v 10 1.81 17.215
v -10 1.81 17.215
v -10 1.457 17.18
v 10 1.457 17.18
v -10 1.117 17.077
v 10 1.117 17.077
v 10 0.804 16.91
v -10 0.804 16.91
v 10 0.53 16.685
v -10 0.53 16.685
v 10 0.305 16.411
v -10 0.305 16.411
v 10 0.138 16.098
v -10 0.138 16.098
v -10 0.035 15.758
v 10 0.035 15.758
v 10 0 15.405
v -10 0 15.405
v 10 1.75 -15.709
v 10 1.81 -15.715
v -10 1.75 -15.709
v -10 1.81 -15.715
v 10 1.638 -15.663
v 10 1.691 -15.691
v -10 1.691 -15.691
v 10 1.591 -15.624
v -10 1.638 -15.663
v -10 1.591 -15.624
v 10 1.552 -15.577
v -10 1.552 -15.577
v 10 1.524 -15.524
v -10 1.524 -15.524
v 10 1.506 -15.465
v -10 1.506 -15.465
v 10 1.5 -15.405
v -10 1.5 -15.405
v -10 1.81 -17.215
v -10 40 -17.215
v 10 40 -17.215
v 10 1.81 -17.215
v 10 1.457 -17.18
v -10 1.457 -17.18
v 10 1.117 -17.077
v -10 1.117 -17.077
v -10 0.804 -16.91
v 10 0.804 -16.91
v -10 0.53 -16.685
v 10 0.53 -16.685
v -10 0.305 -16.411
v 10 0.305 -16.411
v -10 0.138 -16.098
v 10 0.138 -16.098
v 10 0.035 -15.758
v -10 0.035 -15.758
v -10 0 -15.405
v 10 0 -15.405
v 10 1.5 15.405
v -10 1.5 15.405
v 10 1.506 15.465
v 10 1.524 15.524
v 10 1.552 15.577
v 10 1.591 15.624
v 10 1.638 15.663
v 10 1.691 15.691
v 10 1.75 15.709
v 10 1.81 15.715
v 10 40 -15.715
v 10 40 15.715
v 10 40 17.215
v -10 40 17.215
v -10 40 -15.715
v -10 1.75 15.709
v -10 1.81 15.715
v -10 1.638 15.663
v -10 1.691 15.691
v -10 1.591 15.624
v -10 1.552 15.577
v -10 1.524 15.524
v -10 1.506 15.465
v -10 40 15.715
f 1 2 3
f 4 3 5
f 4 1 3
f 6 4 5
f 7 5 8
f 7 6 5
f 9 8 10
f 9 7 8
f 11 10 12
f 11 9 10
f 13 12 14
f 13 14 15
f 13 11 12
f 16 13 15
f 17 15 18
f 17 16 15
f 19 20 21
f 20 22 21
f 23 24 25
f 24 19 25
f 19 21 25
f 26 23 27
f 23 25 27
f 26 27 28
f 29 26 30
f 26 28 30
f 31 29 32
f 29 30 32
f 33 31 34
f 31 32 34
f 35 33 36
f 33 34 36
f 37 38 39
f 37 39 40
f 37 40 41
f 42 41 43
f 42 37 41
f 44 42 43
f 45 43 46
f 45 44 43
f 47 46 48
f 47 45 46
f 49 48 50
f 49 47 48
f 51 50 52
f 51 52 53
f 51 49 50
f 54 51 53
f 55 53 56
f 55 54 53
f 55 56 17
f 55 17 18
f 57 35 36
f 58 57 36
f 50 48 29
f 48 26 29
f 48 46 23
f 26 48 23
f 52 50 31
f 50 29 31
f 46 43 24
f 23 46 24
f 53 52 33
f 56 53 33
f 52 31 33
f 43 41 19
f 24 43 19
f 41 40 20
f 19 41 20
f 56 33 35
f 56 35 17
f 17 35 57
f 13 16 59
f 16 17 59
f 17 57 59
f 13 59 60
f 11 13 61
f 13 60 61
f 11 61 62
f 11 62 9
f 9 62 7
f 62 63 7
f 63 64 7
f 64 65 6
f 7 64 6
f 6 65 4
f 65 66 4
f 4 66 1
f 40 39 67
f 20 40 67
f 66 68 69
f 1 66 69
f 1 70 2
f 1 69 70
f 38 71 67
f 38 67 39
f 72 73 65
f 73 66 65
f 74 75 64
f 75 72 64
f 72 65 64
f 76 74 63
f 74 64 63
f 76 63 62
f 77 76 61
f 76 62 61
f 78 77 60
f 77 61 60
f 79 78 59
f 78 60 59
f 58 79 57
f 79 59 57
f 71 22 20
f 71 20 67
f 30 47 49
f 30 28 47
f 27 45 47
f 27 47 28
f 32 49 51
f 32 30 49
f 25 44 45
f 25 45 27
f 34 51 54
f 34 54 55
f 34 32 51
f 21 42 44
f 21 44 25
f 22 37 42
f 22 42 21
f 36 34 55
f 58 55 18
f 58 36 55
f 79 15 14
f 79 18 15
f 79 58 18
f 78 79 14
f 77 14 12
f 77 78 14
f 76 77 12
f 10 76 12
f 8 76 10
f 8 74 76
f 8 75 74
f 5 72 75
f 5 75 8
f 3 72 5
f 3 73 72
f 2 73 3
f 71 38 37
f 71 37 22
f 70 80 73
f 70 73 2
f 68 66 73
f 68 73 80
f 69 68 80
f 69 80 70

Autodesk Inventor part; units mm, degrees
ref_plane "YZ Plane" through (0, 0, 0) normal (1, 0, 0) x (0, 1, 0)
ref_plane "XZ Plane" through (0, 0, 0) normal (0, 1, 0) x (-1, 0, 0)
ref_plane "XY Plane" through (0, 0, 0) normal (0, 0, 1) x (1, 0, 0)
sketch "Sketch1" plane through (0, 0, 0) normal (0, 1, 0) x (-1, 0, 0)
  line L0 (10, -15.715) -> (-10, -15.715)
  line L1 (-10, -15.715) -> (-10, 15.715)
  line L2 (-10, 15.715) -> (10, 15.715)
  line L3 (10, 15.715) -> (10, -15.715)
  point P0 (0, 0)
  dimension "d0" = 20
  dimension "d1" = 31.43
  dimension "d2" = 10
  dimension "d3" = 15.715
extrude "Plate1" add sketch "Sketch1" along normal blind 1.5
sketch "Sketch2" plane through (10, 0, 17.215) normal (0, 0, -1) x (-1, 0, 0)
  line L0 (20, 0) -> (0, 0)
  line L1 (0, 0) -> (0, 40)
  line L2 (0, 40) -> (20, 40)
  line L3 (20, 40) -> (20, 0)
edge flange "Flange1" height 40 angle 90 thickness 1.5 bend radius 0.31 thickness toward (0, 0, -1) relief tear relief width 1.5 relief depth 0.75 edges at (0, 1.5, 15.715) wall of the first edge with corners at (-10, 0, 17.215) (10, 0, 17.215) (10, 40, 17.215) (-10, 40, 17.215)
bend "Bend1"
corner "Corner1"
sketch "Sketch3" plane through (-10, 0, -17.215) normal (0, 0, 1) x (1, 0, 0)
  line L0 (20, 0) -> (0, 0)
  line L1 (0, 0) -> (0, 40)
  line L2 (0, 40) -> (20, 40)
  line L3 (20, 40) -> (20, 0)
edge flange "Flange2" height 40 angle 90 thickness 1.5 bend radius 0.31 thickness toward (0, 0, 1) relief tear relief width 1.5 relief depth 0.75 edges at (0, 1.5, -15.715) wall of the first edge with corners at (10, 0, -17.215) (-10, 0, -17.215) (-10, 40, -17.215) (10, 40, -17.215)
bend "Bend2"
corner "Corner2"
equation "\"d4\" = Thickness"
equation "\"d5\" = BendReliefWidth"
equation "\"d6\" = BendReliefDepth"
equation "\"d7\" = MinimumRemnant"
equation "\"d8\" = TransitionRadius"
equation "\"d11\" = BendRadius"
equation "\"d12\" = CornerReliefSize"
equation "\"d13\" = GapSize"
equation "\"d14\" = JacobiRadiusSize"
equation "\"d15\" = BendReliefWidth"
equation "\"d16\" = BendReliefDepth"
equation "\"d17\" = MinimumRemnant"
equation "\"d18\" = TransitionRadius"
equation "\"d21\" = BendRadius"
equation "\"d22\" = CornerReliefSize"
equation "\"d23\" = GapSize"
equation "\"d24\" = JacobiRadiusSize"
equation "\"BendReliefWidth\" = Thickness"
equation "\"BendReliefDepth\" = 0.5 * Thickness"
equation "\"CornerReliefSize\" = 4 * Thickness"
equation "\"MinimumRemnant\" = 2 * Thickness"
equation "\"TransitionRadius\" = BendRadius"
equation "\"JacobiRadiusSize\" = BendRadius"
equation "\"GapSize\" = Thickness"
equation "\"Thickness\" = 1.5"
equation "\"BendRadius\" = 0.31"
properties part number "axis_7_top_frame" material "Aluminum 6061-AHC"
